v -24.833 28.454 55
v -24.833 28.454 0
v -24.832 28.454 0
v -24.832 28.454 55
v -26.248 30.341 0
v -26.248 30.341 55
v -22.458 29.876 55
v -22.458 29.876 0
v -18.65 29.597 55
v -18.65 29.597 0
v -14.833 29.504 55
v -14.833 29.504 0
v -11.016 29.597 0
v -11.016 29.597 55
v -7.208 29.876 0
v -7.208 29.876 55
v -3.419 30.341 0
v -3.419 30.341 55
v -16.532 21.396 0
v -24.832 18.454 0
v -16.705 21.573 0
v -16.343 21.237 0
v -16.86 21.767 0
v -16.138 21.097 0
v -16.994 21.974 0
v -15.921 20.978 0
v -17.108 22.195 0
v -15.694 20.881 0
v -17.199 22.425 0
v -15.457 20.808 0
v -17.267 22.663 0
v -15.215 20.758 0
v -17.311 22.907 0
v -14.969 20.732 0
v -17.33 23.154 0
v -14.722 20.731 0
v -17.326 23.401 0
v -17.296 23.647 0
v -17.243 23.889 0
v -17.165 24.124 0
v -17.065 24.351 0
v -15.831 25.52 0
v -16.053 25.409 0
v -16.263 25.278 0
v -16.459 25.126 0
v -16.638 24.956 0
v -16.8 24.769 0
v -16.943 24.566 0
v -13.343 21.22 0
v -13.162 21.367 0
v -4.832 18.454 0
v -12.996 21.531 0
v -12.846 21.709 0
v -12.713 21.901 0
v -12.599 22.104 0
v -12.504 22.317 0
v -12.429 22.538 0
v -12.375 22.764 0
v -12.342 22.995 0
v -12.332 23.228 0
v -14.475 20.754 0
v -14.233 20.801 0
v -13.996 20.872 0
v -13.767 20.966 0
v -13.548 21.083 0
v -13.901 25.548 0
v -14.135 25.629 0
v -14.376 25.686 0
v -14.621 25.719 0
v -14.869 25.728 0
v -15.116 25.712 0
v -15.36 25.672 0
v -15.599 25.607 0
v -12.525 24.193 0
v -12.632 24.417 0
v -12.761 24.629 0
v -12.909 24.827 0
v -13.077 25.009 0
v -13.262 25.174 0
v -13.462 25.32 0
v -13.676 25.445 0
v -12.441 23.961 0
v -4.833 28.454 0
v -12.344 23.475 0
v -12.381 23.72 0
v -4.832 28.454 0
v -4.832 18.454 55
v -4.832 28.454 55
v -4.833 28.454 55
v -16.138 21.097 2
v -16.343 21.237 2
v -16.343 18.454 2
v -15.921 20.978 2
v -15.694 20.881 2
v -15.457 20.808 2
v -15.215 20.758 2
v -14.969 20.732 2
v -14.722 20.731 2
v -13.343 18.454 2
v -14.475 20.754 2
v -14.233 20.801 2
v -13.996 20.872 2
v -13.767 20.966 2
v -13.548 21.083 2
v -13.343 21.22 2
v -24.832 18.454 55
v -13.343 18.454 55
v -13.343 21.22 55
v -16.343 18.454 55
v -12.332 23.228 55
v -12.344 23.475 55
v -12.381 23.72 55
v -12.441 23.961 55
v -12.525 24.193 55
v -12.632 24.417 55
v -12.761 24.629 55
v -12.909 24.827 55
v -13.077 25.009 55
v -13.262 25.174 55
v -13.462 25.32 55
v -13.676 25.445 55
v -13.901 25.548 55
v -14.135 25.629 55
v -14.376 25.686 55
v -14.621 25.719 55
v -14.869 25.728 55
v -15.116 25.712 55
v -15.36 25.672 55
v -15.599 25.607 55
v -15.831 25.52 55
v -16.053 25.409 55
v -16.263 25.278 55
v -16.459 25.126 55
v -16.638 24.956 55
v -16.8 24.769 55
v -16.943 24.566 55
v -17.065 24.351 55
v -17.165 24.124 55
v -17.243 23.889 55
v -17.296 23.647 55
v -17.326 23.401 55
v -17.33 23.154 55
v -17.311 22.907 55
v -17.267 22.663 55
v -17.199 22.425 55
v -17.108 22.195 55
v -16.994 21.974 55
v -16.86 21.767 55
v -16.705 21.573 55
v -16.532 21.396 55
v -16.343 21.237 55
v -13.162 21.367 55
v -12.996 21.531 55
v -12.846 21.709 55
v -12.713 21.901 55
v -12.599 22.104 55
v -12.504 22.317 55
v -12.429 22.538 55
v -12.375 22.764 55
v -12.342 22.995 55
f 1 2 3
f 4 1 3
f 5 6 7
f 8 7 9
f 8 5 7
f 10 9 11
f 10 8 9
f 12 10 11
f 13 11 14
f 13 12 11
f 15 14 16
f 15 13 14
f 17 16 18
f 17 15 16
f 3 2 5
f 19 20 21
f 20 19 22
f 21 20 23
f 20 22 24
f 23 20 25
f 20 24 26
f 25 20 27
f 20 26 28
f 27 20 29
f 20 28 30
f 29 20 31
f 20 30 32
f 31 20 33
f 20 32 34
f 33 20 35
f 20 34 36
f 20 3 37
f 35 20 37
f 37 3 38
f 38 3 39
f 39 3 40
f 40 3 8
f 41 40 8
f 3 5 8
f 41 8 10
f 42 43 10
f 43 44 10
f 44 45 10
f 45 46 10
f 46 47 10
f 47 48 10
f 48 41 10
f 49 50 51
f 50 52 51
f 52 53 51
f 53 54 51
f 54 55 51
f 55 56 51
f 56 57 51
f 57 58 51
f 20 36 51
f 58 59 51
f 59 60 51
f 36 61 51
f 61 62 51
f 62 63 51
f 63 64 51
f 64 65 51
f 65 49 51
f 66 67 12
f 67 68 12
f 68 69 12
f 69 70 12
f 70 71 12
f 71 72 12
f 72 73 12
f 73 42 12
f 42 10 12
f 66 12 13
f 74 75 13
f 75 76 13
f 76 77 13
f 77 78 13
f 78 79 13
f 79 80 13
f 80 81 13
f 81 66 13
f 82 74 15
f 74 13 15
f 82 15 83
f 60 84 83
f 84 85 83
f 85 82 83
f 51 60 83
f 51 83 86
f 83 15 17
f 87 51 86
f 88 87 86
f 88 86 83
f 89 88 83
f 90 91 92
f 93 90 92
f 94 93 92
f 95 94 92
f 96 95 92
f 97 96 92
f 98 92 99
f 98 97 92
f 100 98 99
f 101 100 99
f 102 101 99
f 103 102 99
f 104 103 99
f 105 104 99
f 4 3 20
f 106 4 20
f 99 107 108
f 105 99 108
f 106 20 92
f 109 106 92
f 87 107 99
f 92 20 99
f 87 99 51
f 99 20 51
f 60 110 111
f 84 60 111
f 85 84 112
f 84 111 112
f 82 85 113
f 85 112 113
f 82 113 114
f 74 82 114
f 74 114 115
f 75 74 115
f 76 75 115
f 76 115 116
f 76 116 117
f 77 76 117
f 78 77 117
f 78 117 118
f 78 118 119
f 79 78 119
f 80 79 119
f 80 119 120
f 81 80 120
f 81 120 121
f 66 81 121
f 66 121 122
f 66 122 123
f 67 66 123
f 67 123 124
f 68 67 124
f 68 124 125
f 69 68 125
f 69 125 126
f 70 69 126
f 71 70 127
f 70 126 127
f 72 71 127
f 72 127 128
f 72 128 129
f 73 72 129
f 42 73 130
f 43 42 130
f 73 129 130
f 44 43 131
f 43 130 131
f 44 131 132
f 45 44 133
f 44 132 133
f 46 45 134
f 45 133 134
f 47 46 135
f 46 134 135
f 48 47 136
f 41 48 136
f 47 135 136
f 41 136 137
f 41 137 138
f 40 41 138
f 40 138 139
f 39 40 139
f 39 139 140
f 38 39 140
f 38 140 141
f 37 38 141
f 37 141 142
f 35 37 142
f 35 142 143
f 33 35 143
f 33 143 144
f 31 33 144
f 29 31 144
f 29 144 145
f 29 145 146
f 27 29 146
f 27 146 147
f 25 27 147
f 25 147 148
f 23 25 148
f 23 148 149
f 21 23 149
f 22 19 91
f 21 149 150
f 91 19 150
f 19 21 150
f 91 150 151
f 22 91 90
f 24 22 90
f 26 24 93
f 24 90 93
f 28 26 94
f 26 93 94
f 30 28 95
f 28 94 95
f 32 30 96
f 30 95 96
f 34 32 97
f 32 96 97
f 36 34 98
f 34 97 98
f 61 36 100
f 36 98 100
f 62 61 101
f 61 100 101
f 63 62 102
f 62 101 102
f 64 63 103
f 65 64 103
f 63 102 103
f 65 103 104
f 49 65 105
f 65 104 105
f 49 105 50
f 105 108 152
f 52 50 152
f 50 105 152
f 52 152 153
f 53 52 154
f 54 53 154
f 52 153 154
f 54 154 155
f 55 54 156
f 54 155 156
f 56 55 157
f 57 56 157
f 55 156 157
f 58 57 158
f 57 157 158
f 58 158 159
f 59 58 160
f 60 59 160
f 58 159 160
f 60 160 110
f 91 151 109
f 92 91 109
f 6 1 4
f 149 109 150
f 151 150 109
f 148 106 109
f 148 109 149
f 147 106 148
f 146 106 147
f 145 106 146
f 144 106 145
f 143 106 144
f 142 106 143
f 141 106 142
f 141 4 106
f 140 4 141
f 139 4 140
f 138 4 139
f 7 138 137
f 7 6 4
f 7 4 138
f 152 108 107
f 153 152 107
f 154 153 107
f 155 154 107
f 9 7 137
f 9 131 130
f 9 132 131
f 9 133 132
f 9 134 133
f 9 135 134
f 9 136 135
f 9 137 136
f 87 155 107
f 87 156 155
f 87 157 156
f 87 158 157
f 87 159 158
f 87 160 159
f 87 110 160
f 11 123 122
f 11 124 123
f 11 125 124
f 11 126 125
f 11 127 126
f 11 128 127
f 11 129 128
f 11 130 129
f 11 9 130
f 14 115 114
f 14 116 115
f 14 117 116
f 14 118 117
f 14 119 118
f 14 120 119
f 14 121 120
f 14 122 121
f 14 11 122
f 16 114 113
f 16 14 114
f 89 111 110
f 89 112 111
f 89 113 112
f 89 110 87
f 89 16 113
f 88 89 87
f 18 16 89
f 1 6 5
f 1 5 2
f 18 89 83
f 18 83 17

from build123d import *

# Parameters (mm, degrees)
F2_DEPTH = 55
F1_R     = 78.277093
F3_DEPTH = 60
F5_DEPTH = 60
F6_DEPTH = 53


with BuildPart() as f2:
    # F0 (on Top) → F2 (new body)
    with BuildSketch(Plane.XY):
        Polygon((-4.833426, 28.454347), (-24.831566, 28.454347), (-24.831566, 18.454347), (-4.831566, 18.454347), (-4.831566, 28.454347), align=None)
        Polygon((-24.833426, 28.454347), (-24.831566, 28.454347), (-4.833426, 28.454347), (-3.333426, 30.454347), (-26.333426, 30.454347), align=None)
    extrude(amount=F2_DEPTH)

    # F1 (on Top) → F3 (cut)
    with BuildSketch(Plane.XY):
        with Locations((-14.833426, 107.780978)):
            Circle(F1_R)
    extrude(amount=F3_DEPTH, mode=Mode.SUBTRACT)

    # F4 (on face) → F5 (cut)
    with BuildSketch(Plane.XY.offset(55)):
        with BuildLine():
            ThreePointArc((-13.342683, 21.219841), (-12.598608, 22.103899), (-12.331566, 23.228131))
            ThreePointArc((-12.331566, 23.228131), (-15.943368, 25.467304), (-16.342683, 21.236517))
            Line((-16.342683, 21.236517), (-13.342683, 21.236517))
            Line((-13.342683, 21.236517), (-13.342683, 21.219841))
        make_face()
        with BuildLine():
            Line((-13.342683, 21.236517), (-16.342683, 21.236517))
            ThreePointArc((-16.342683, 21.236517), (-14.845463, 20.72817), (-13.342683, 21.219841))
            Line((-13.342683, 21.219841), (-13.342683, 21.236517))
        make_face()
    extrude(amount=-F5_DEPTH, mode=Mode.SUBTRACT)

    # F4 (on face) → F6 (cut)
    with BuildSketch(Plane.XY.offset(55)):
        with BuildLine():
            ThreePointArc((-13.342683, 21.219841), (-14.845463, 20.72817), (-16.342683, 21.236517))
            Line((-16.342683, 21.236517), (-16.342683, 18.454347))
            Line((-16.342683, 18.454347), (-13.342683, 18.454347))
            Line((-13.342683, 18.454347), (-13.342683, 21.219841))
        make_face()
    extrude(amount=-F6_DEPTH, mode=Mode.SUBTRACT)


solid = f2.part
